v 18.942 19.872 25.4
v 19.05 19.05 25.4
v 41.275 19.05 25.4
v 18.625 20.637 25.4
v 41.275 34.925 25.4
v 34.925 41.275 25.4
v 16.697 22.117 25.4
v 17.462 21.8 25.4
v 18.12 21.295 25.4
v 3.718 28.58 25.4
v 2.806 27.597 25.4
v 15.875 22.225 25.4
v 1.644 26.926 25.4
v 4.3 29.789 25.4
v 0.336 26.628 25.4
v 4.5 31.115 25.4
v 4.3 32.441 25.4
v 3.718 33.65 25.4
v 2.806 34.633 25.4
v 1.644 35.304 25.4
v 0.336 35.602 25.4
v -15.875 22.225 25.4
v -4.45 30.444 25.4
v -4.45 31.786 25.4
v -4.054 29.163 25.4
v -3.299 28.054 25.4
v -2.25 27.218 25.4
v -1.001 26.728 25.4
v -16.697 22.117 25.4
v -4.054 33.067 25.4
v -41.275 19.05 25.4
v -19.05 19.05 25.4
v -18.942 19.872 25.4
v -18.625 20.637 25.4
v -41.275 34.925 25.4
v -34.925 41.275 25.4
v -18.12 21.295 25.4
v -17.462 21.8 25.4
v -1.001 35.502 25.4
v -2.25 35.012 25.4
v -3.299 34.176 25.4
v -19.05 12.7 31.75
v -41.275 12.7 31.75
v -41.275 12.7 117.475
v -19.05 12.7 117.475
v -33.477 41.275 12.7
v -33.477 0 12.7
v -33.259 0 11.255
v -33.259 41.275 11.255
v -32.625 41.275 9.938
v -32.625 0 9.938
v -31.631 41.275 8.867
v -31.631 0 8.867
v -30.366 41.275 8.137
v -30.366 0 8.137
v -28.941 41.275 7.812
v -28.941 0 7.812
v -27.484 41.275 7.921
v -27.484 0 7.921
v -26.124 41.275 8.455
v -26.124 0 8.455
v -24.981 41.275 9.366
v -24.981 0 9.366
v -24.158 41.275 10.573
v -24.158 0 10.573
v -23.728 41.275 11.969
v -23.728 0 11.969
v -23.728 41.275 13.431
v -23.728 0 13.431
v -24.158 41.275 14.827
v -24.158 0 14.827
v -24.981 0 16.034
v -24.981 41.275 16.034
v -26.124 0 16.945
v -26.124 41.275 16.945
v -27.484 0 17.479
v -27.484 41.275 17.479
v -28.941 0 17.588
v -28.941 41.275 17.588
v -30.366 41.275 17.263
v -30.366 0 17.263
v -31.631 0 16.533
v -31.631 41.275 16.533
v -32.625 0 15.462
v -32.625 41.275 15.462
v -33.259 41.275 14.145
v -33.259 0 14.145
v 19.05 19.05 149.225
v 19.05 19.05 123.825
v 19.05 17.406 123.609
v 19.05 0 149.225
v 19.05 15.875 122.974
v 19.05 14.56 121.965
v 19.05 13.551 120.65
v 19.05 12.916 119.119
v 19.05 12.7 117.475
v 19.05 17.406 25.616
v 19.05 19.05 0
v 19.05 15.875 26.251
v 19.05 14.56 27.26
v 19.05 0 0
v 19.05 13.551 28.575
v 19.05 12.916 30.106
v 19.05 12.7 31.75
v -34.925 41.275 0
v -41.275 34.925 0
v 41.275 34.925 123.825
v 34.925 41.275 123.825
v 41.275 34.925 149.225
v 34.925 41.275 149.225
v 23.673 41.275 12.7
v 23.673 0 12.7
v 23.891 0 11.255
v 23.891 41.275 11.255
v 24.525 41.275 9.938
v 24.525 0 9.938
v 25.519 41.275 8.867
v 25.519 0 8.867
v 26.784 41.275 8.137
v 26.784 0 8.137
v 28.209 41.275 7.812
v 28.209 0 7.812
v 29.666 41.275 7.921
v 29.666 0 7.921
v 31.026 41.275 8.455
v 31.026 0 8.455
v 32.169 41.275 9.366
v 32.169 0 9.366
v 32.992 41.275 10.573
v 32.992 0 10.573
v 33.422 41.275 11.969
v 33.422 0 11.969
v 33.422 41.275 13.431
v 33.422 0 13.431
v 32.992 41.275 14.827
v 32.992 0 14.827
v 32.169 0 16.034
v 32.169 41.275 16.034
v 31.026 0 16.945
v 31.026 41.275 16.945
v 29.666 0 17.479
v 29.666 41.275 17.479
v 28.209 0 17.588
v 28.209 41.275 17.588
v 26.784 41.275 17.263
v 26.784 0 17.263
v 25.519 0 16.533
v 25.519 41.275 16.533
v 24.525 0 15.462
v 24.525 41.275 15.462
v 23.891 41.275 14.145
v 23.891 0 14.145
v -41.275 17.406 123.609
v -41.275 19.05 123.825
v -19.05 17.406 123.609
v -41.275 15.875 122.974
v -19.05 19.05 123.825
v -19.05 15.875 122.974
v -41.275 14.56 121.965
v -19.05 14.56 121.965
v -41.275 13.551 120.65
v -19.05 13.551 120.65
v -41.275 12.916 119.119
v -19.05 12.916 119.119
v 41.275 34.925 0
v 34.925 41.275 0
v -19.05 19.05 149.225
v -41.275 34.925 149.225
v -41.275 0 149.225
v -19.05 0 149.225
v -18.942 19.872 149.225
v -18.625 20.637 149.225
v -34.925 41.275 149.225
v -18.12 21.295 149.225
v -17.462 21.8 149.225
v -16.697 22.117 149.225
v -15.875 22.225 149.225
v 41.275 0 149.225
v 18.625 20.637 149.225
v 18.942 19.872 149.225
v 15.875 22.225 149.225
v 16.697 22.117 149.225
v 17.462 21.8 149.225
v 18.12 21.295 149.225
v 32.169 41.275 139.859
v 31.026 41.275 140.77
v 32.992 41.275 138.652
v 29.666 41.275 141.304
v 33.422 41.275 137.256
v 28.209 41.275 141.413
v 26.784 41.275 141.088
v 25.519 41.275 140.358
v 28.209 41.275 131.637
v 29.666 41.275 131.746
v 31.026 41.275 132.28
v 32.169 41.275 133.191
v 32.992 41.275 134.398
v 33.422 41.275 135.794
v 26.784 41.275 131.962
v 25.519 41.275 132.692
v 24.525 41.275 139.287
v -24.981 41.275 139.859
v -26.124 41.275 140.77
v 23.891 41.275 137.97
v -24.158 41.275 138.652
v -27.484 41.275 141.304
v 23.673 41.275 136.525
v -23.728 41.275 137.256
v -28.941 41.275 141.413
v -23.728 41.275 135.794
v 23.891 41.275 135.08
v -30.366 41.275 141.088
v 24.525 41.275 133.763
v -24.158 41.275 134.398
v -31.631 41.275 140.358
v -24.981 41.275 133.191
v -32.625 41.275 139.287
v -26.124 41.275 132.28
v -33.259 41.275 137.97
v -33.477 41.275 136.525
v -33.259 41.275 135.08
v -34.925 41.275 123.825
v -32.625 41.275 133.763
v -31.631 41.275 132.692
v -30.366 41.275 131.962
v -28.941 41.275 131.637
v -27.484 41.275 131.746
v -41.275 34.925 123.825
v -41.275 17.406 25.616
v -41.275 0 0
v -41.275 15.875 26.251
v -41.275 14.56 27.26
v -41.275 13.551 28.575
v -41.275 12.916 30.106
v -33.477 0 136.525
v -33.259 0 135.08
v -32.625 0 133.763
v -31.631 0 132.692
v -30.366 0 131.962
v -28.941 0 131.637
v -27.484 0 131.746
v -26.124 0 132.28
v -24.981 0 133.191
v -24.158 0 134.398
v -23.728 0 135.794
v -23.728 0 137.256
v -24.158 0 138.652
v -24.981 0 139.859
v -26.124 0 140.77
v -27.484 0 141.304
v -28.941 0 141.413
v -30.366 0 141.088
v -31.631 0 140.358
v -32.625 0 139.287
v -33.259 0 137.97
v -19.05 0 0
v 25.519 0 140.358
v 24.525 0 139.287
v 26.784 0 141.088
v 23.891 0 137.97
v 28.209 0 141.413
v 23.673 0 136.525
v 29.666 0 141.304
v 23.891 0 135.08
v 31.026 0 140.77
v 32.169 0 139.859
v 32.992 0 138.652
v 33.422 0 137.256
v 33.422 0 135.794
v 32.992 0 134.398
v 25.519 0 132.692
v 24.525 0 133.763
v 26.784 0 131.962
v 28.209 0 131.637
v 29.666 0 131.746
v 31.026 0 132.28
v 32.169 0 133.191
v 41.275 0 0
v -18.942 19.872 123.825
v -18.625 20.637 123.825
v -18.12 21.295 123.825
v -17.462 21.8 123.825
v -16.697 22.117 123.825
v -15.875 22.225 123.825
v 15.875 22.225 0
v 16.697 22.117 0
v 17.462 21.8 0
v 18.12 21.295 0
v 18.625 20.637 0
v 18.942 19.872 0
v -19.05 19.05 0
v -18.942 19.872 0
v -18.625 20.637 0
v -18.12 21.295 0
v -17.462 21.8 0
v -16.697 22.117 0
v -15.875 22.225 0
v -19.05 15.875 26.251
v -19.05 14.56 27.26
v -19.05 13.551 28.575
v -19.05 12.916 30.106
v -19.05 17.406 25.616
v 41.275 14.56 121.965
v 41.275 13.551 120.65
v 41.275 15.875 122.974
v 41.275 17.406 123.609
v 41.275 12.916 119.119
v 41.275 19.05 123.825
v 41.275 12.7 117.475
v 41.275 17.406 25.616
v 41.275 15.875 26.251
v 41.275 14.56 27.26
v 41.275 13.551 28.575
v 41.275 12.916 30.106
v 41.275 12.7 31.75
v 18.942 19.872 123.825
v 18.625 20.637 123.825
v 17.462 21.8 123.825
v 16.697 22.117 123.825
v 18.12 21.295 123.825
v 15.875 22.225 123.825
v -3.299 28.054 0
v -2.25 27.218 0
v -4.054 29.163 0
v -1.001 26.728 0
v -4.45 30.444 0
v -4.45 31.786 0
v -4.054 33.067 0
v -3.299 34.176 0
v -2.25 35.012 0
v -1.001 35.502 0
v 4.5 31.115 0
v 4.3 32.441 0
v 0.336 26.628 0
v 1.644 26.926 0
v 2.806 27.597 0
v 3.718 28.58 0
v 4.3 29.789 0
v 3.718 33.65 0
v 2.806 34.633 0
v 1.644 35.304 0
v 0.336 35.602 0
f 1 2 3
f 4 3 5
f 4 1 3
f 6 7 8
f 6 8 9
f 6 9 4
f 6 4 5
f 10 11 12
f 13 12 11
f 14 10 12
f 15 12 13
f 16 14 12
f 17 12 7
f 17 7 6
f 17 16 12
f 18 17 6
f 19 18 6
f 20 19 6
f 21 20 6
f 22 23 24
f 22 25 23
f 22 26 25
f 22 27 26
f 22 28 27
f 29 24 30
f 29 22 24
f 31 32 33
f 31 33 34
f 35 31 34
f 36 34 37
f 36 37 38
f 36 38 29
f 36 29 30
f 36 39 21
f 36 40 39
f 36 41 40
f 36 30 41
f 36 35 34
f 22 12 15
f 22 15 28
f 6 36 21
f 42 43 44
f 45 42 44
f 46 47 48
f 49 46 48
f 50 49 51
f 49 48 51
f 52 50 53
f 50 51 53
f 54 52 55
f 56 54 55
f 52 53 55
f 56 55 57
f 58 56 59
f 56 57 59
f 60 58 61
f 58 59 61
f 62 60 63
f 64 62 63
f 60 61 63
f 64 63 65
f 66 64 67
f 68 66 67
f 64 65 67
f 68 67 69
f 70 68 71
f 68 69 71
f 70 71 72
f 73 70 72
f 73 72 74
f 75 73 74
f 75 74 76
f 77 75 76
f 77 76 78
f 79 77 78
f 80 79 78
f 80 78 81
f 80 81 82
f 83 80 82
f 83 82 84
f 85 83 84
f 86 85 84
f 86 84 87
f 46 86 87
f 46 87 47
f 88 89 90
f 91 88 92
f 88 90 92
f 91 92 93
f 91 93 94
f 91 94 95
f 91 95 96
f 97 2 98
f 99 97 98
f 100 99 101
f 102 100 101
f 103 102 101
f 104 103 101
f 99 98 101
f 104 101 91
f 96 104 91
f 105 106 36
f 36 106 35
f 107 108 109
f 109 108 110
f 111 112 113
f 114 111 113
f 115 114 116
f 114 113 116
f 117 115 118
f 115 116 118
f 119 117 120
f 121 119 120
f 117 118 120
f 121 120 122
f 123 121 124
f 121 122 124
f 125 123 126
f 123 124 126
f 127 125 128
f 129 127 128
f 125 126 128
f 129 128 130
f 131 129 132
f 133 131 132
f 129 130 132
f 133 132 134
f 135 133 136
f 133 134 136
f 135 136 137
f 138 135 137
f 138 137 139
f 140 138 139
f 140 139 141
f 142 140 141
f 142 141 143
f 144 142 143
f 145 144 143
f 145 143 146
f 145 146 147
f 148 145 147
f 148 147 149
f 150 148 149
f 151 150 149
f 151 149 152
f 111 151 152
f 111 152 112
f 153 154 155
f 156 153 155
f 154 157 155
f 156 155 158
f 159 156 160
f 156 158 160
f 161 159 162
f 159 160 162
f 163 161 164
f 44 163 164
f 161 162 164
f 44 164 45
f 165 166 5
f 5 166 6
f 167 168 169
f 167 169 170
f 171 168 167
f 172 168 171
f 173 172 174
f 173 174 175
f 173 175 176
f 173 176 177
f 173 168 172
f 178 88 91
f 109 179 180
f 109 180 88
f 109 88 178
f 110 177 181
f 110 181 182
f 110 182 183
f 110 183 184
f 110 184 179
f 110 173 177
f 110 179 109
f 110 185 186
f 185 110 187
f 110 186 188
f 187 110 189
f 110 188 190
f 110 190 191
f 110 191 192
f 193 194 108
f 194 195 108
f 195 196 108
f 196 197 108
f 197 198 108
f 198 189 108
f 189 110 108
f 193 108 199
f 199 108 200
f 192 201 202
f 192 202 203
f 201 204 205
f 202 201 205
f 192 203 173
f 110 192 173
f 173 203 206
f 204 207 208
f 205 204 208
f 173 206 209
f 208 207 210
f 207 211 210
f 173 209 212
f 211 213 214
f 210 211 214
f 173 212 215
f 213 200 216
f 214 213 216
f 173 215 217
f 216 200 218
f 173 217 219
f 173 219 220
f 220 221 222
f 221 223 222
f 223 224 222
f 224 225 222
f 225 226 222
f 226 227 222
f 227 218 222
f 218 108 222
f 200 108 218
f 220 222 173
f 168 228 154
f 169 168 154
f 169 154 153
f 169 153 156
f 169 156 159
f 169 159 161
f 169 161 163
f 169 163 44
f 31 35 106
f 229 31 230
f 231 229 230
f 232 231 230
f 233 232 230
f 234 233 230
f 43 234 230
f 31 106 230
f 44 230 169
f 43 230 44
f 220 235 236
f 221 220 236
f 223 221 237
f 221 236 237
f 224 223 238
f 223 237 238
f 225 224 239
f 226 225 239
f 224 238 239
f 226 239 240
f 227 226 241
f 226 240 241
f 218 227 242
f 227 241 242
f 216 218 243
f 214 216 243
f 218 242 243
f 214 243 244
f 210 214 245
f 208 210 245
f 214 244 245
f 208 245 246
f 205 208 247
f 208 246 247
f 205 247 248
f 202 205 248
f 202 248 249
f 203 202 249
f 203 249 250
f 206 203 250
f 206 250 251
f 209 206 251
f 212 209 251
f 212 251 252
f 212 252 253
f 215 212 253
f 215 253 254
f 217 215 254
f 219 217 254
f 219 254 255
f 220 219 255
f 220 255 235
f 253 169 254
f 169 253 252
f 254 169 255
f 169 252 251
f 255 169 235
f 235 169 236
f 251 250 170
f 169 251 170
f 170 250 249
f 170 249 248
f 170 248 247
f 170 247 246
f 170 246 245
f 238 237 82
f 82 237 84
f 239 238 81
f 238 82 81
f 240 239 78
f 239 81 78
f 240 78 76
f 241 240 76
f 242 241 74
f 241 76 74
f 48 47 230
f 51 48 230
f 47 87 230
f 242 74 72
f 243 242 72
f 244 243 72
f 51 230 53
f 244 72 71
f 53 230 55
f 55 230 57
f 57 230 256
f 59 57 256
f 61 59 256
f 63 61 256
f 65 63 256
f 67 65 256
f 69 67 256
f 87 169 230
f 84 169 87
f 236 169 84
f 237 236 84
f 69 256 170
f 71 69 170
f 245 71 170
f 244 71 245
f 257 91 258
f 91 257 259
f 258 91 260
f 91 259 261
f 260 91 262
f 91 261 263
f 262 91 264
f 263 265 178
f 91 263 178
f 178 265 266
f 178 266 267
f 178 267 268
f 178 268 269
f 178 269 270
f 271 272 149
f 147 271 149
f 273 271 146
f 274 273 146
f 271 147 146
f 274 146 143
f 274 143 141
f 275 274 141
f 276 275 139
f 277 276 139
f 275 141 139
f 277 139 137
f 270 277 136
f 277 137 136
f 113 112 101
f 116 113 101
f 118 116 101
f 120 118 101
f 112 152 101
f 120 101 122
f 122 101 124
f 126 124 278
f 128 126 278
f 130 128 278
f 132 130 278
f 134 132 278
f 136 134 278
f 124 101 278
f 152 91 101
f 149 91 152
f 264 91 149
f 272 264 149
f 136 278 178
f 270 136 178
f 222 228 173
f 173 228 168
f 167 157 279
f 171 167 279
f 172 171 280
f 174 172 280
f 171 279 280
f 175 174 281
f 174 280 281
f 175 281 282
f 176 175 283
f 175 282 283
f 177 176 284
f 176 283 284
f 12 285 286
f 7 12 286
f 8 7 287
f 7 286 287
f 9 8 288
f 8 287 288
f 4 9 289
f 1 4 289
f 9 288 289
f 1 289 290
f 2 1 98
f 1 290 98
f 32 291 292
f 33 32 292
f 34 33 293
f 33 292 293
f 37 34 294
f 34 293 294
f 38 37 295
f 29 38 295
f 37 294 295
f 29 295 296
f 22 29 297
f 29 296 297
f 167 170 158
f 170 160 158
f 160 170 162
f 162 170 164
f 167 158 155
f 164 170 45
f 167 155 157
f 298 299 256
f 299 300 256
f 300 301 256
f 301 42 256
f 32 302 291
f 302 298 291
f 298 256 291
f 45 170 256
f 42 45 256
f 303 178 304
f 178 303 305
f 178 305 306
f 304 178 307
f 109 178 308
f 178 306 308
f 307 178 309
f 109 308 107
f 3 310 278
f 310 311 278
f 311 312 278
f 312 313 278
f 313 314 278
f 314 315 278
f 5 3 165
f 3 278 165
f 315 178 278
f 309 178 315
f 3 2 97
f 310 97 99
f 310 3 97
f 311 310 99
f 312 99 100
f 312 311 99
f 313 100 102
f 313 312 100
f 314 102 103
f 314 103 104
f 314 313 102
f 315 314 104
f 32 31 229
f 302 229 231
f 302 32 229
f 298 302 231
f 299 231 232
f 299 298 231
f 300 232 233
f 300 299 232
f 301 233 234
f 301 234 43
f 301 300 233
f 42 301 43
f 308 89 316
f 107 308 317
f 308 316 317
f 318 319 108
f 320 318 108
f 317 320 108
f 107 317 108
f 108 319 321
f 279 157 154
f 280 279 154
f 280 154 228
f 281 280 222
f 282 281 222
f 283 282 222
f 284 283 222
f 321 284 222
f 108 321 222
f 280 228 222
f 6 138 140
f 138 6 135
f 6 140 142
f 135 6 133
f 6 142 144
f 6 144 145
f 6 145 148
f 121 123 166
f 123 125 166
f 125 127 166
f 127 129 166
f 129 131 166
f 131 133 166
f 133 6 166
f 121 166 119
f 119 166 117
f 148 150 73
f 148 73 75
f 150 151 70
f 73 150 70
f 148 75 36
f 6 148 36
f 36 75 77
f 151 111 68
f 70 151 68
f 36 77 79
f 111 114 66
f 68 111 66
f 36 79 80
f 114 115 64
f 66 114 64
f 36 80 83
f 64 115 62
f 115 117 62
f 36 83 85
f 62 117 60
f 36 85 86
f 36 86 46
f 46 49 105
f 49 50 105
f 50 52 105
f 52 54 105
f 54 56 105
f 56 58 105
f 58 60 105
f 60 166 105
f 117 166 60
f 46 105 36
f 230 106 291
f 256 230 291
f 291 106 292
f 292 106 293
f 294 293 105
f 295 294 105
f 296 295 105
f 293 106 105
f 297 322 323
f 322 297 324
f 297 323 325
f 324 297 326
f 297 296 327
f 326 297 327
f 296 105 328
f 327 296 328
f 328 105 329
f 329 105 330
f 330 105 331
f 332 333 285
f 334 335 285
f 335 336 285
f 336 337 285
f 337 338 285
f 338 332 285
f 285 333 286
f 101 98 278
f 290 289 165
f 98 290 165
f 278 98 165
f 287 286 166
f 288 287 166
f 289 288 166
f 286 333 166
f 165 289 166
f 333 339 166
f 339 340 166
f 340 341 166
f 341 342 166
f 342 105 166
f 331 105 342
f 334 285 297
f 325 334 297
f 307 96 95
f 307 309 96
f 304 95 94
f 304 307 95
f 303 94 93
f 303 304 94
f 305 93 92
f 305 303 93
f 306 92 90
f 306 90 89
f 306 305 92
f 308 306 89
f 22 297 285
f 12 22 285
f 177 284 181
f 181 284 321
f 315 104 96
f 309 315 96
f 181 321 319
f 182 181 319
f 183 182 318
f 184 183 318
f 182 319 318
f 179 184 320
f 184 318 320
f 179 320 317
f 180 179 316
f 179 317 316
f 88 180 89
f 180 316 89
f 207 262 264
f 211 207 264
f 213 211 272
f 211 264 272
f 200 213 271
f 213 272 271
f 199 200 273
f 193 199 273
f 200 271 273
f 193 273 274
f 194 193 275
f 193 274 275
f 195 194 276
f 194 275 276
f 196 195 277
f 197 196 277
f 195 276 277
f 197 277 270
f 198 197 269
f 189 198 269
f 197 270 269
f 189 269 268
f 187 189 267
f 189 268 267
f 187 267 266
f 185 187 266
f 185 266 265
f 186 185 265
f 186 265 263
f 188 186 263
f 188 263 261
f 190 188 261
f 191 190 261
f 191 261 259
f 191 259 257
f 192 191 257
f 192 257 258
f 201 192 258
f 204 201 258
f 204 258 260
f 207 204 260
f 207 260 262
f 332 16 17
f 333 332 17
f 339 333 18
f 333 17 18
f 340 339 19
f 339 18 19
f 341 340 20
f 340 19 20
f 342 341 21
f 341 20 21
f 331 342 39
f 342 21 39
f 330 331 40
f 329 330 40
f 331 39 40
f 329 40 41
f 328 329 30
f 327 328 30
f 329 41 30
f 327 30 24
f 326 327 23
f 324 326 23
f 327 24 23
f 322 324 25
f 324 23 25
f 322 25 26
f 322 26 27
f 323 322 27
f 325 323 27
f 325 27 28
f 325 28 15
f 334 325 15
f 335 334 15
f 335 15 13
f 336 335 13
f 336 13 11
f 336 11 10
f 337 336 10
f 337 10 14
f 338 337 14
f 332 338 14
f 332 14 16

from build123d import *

# Parameters (mm, degrees)
BOSS_EXTRUDE1_DEPTH     = 149.225
CHAMFER1_SIZE           = 6.35
F_3_8_CLEARANCE_HOLE1_D = 9.8044
SKETCH4_W               = 98.425
SKETCH4_H               = 28.575
CUT_EXTRUDE1_DEPTH      = 176.460048872
FILLET1_R               = 6.35
CUT_EXTRUDE2_START      = -123.825
SKETCH5_R               = 4.500000017
CUT_EXTRUDE2_DEPTH      = 40.64


with BuildPart() as part:
    # Sketch1 → Boss-Extrude1 (new body)
    with BuildSketch(Plane.XY):
        with BuildLine():
            Line((-19.05, 0), (-19.05, 19.05))
            ThreePointArc((-19.05, 19.05), (-18.12006403, 21.29506403), (-15.875, 22.225))
            Line((-15.875, 22.225), (15.875, 22.225))
            ThreePointArc((15.875, 22.225), (18.12006403, 21.29506403), (19.05, 19.05))
            Line((19.05, 19.05), (19.05, 0))
            Line((19.05, 0), (41.275, 0))
            Line((41.275, 0), (41.275, 41.275))
            Line((41.275, 41.275), (-41.275, 41.275))
            Line((-41.275, 41.275), (-41.275, 0))
            Line((-41.275, 0), (-19.05, 0))
        make_face()
    extrude(amount=BOSS_EXTRUDE1_DEPTH)

    # Chamfer1
    chamfer1_edges = [part.edges().sort_by_distance(p)[0] for p in [
        (-41.275, 41.275, 74.6125),
        (41.275, 41.275, 74.6125),
    ]]
    chamfer(chamfer1_edges, length=CHAMFER1_SIZE)

    # 3/8 Clearance Hole1 (through all)
    with Locations(Plane(origin=(0, 41.275, 0), x_dir=(1, 0, 0), z_dir=(0, 1, 0))):
        with Locations((28.575, -12.7), (-28.575, -136.525), (-28.575, -12.7), (28.575, -136.525)):
            Hole(F_3_8_CLEARANCE_HOLE1_D / 2)

    # Sketch4 → Cut-Extrude1 (cut, through all)
    with BuildSketch(Plane.ZY.offset(41.275)):
        with Locations((74.6125, 26.9875)):
            Rectangle(SKETCH4_W, SKETCH4_H)
    extrude(amount=-CUT_EXTRUDE1_DEPTH, mode=Mode.SUBTRACT)

    # Fillet1
    fillet1_edges = [part.edges().sort_by_distance(p)[0] for p in [
        (30.1625, 12.7, 25.4),
        (30.1625, 12.7, 123.825),
        (-30.1625, 12.7, 123.825),
        (-30.1625, 12.7, 25.4),
    ]]
    fillet(fillet1_edges, radius=FILLET1_R)

    # Sketch5 → Cut-Extrude2 (cut)
    with BuildSketch(Plane.XY.offset(149.225).offset(CUT_EXTRUDE2_START)):
        with Locations((0, 31.115)):
            Circle(SKETCH5_R)
    extrude(amount=-CUT_EXTRUDE2_DEPTH, mode=Mode.SUBTRACT)


solid = part.part
